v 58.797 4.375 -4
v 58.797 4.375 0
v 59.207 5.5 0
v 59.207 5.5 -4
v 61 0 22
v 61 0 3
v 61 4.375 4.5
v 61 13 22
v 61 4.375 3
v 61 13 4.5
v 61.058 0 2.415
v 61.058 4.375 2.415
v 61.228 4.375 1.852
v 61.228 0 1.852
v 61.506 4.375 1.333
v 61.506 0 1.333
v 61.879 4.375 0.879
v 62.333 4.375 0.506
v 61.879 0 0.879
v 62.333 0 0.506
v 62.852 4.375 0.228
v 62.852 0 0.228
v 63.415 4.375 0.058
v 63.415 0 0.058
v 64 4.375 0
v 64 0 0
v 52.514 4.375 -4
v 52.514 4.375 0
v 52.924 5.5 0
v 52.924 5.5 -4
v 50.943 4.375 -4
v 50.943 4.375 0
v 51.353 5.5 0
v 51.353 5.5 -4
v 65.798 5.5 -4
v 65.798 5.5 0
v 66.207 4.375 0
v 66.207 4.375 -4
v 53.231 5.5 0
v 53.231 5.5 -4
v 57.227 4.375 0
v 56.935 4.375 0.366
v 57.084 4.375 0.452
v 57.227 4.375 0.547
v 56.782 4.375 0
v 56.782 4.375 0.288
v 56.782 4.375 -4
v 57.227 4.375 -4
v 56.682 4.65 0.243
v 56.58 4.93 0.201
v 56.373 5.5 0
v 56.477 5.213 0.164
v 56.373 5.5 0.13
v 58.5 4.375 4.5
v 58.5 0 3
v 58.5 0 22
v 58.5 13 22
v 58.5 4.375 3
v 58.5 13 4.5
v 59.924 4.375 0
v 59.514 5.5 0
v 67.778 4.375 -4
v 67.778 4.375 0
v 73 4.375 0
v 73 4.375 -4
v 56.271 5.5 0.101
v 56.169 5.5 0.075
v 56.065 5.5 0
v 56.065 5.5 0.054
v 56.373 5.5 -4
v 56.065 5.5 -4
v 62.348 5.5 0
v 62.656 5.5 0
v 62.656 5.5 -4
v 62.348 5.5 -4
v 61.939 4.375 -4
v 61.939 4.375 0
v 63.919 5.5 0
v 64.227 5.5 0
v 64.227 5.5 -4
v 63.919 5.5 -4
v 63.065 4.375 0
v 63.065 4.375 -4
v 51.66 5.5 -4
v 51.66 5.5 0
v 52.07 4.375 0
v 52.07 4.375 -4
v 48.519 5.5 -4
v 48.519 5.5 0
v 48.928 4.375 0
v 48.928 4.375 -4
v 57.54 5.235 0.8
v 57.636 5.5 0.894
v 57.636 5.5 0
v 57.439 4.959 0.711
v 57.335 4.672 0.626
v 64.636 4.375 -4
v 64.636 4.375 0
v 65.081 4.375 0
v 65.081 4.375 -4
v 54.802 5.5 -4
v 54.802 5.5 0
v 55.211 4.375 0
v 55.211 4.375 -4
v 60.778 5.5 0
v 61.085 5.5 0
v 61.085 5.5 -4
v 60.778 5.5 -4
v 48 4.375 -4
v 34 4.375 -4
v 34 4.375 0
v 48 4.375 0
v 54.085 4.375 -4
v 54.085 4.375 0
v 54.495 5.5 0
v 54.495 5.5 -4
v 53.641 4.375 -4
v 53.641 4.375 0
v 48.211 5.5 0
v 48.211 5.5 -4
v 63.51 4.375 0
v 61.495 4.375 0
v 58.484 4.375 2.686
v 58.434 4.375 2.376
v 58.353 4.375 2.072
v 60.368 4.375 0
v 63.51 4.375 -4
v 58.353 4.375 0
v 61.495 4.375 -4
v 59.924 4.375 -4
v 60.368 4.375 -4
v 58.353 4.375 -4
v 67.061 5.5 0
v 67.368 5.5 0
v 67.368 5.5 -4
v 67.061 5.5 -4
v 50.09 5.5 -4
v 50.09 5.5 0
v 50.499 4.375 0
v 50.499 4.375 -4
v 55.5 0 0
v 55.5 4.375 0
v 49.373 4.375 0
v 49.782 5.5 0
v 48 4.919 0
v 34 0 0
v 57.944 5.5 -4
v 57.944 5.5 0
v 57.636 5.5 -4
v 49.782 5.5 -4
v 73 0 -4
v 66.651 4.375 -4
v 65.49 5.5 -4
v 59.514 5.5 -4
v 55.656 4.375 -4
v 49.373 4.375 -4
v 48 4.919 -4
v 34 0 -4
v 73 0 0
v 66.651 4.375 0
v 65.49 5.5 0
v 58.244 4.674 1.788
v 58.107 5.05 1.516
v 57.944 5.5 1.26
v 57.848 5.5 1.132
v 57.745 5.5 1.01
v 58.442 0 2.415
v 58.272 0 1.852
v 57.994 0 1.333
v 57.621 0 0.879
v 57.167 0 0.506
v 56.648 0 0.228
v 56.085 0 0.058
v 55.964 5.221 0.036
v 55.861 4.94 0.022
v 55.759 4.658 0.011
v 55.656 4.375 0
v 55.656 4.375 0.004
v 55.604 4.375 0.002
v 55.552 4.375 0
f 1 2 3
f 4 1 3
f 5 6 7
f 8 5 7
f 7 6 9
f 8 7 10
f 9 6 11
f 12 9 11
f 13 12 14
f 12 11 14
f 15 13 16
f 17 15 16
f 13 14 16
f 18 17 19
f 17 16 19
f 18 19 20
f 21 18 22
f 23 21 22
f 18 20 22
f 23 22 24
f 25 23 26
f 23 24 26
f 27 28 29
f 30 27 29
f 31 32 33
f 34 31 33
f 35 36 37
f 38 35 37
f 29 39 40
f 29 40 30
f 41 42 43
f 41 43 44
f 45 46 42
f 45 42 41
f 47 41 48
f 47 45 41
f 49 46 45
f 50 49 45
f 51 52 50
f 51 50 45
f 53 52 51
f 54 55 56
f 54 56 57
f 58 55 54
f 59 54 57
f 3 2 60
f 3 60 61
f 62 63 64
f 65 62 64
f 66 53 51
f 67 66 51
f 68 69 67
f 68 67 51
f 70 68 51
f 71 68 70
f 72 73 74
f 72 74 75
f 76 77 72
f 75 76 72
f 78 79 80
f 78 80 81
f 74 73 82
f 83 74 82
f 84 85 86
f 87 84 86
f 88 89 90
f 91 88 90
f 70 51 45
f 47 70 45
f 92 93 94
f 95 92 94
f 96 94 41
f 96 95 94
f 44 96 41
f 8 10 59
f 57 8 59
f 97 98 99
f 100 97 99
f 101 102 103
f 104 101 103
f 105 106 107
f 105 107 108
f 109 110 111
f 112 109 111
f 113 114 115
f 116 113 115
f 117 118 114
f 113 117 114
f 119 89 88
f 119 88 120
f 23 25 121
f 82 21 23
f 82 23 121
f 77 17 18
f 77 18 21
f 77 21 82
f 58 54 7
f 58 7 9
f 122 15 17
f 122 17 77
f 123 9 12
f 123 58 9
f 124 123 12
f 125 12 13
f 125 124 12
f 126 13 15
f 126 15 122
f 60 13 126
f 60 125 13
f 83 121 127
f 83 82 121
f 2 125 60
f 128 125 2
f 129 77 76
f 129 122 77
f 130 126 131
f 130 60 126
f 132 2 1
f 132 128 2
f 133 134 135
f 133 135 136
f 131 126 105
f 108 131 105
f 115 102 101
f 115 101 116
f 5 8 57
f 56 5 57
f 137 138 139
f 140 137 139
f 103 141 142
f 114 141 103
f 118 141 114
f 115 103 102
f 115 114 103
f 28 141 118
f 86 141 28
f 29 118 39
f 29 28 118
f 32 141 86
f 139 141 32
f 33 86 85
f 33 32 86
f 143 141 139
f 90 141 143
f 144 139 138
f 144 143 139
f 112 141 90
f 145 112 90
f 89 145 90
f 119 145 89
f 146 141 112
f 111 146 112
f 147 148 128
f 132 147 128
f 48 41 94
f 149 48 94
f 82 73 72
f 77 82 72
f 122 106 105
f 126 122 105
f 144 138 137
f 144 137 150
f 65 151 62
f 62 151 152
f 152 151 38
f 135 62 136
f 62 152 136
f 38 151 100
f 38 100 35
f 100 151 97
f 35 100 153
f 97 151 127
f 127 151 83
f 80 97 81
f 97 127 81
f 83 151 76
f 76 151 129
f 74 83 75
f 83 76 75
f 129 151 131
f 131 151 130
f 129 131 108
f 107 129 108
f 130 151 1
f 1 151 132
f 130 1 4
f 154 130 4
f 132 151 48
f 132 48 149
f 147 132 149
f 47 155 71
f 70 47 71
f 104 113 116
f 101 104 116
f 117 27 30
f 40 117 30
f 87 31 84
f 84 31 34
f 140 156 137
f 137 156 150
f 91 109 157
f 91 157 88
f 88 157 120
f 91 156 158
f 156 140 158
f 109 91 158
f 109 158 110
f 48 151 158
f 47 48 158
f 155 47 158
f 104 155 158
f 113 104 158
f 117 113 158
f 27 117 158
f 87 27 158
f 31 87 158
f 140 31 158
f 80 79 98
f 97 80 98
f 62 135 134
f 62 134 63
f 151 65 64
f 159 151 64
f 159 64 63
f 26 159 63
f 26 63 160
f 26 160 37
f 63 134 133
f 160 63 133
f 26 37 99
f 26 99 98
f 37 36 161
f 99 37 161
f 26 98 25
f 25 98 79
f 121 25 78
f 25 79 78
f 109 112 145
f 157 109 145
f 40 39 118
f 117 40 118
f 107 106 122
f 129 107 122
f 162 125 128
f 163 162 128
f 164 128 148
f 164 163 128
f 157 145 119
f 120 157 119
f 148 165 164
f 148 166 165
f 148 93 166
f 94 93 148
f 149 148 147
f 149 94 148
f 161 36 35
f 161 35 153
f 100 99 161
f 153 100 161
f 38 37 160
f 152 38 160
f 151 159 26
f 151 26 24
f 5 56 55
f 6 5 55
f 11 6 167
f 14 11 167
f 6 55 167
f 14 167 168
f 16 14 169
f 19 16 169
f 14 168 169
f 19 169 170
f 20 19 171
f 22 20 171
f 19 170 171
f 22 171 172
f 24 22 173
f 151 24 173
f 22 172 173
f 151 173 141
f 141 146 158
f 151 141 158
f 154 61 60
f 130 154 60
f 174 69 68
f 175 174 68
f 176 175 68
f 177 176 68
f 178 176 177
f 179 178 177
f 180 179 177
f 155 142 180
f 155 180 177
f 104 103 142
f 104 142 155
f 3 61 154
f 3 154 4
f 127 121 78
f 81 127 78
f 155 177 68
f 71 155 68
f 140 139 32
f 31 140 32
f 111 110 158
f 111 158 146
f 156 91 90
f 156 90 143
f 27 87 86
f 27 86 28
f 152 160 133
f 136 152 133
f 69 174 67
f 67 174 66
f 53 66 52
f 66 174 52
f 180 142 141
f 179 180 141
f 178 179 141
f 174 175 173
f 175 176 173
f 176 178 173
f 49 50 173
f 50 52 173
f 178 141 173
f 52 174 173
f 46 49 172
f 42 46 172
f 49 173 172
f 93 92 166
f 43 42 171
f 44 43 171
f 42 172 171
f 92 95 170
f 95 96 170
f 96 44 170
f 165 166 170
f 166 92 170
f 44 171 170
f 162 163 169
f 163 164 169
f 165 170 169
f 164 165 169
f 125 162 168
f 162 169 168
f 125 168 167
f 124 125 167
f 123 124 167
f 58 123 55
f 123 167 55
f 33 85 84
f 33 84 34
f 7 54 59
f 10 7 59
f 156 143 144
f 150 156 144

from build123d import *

# Parameters (mm, degrees)
BLANKSKE_W               = 20
BLANKSKE_H               = 5.5
BLANK_DEPTH              = 4
TOOTHCUTSIM_DEPTH        = 22.124630174
TEETHCUTS_COUNT          = 14
TEETHCUTS_PITCH          = 1.570796325
SKETCH1_W                = 2.5
SKETCH1_H                = 13
BOSS_EXTRUDE1_DEPTH      = 22
BOSS_EXTRUDE3_DEPTH      = 5
BOSS_EXTRUDE3_DEPTH_BACK = 34
SKETCH3_W                = 4
SKETCH3_H                = 4.375
CUT_EXTRUDE1_DEPTH       = 38.175260591
CUT_EXTRUDE1_DEPTH_BACK  = 38.175260591
SKETCH4_W                = 4.5
SKETCH4_H                = 8.625
FILLET1_R                = 3


with BuildPart() as part:
    # BlankSke → Blank (new body)
    with BuildSketch(Plane.XY):
        with Locations((10, 2.75)):
            Rectangle(BLANKSKE_W, BLANKSKE_H)
    extrude(amount=-BLANK_DEPTH)

    # TooCutSkeSim → ToothCutSim (cut, through all)
    with BuildSketch(Plane.XY):
        Polygon((0.222217685, 4.375), (-0.222217685, 4.375), (-0.640929042, 5.5254), (0.640929042, 5.5254), align=None)
    toothcutsim = extrude(amount=-TOOTHCUTSIM_DEPTH, mode=Mode.SUBTRACT)

    # TeethCuts: ToothCutSim ×14
    with Locations(*[(i * TEETHCUTS_PITCH, 0, 0) for i in range(1, TEETHCUTS_COUNT)]):
        add(toothcutsim, mode=Mode.SUBTRACT)

    # Sketch1 → Boss-Extrude1 (add)
    with BuildSketch(Plane.XY):
        with Locations((8.25, 6.5)):
            Rectangle(SKETCH1_W, SKETCH1_H)
    extrude(amount=BOSS_EXTRUDE1_DEPTH)

    # Sketch3 → Boss-Extrude3 (add, two sides: drawn at the far end of the back side and taken through both)
    with BuildSketch(Plane.ZY.offset(-BOSS_EXTRUDE3_DEPTH_BACK)):
        with Locations((-2, 2.1875)):
            Rectangle(SKETCH3_W, SKETCH3_H)
    extrude(amount=BOSS_EXTRUDE3_DEPTH + BOSS_EXTRUDE3_DEPTH_BACK)

    # Sketch4 → Cut-Extrude1 (cut, two sides: drawn at the far end of the back side and taken through both)
    with BuildSketch(Plane.ZY.offset(-7).offset(-CUT_EXTRUDE1_DEPTH_BACK)):
        with Locations((2.25, 8.6875)):
            Rectangle(SKETCH4_W, SKETCH4_H)
    extrude(amount=CUT_EXTRUDE1_DEPTH + CUT_EXTRUDE1_DEPTH_BACK, mode=Mode.SUBTRACT)

    # Fillet1
    # the kernel refuses this fillet: 3 mm, written as the material it adds along each edge
    with BuildSketch(Plane(origin=(7, 0, 0), x_dir=(0, 0, 1), z_dir=(0, 1, 0))) as fillet1_piece_1:
        with BuildLine():
            CenterArc((FILLET1_R, -FILLET1_R), FILLET1_R, 90, 90)
            Line((0, -FILLET1_R), (0, 0))
            Line((0, 0), (FILLET1_R, 0))
        make_face()
    extrude(amount=4.375)
    with BuildSketch(Plane(origin=(9.5, 0, 0), x_dir=(0, 0, 1), z_dir=(0, 1, 0))) as fillet1_piece_2:
        with BuildLine():
            CenterArc((FILLET1_R, FILLET1_R), FILLET1_R, 180, 90)
            Line((0, FILLET1_R), (0, 0))
            Line((0, 0), (FILLET1_R, 0))
        make_face()
    extrude(amount=4.375)
    with BuildSketch(Plane(origin=(9.5, -7.5, 0), x_dir=(0, 0, 1), z_dir=(0, 1, 0))) as fillet1_piece_3_section:
        with BuildLine():
            CenterArc((FILLET1_R, FILLET1_R), FILLET1_R, 180, 90)
            Line((0, FILLET1_R), (0, 0))
            Line((0, 0), (FILLET1_R, 0))
        make_face()
    fillet1_piece_3 = extrude(amount=19.375, mode=Mode.PRIVATE)
    fillet1_piece_3 = split(fillet1_piece_3, bisect_by=Plane(origin=(11.636487366, 4.375, 0.067590567), z_dir=(0, 1, 0)), keep=Keep.TOP, mode=Mode.PRIVATE)
    fillet1_piece_3 = split(fillet1_piece_3, bisect_by=Plane(origin=(11.636487366, 5.5, 0.067590567), z_dir=(0, -1, 0)), keep=Keep.TOP, mode=Mode.PRIVATE)
    fillet1_piece_3 = split(fillet1_piece_3, bisect_by=Plane(origin=(11.407964632, 4.897495122, 0.067590567), z_dir=(0.9396926207859105, -0.3420201433256629, 0)), keep=Keep.TOP, mode=Mode.PRIVATE)
    fillet1_piece_3 = split(fillet1_piece_3, bisect_by=Plane(origin=(12.120177158, 4.990368336, 0.067590567), z_dir=(-0.9396926207859105, -0.3420201433256629, 0)), keep=Keep.TOP, mode=Mode.PRIVATE)
    add(fillet1_piece_3)
    with BuildSketch(Plane(origin=(9.5, -7.5, 0), x_dir=(0, 0, 1), z_dir=(0, 1, 0))) as fillet1_piece_4_section:
        with BuildLine():
            CenterArc((FILLET1_R, FILLET1_R), FILLET1_R, 180, 90)
            Line((0, FILLET1_R), (0, 0))
            Line((0, 0), (FILLET1_R, 0))
        make_face()
    fillet1_piece_4 = extrude(amount=19.375, mode=Mode.PRIVATE)
    fillet1_piece_4 = split(fillet1_piece_4, bisect_by=Plane(origin=(10.146205087, 4.375, 0.590480104), z_dir=(0, 1, 0)), keep=Keep.TOP, mode=Mode.PRIVATE)
    fillet1_piece_4 = split(fillet1_piece_4, bisect_by=Plane(origin=(9.84999644, 4.932740127, 0.590480104), z_dir=(0.9396926207859105, -0.3420201433256629, 0)), keep=Keep.TOP, mode=Mode.PRIVATE)
    fillet1_piece_4 = split(fillet1_piece_4, bisect_by=Plane(origin=(10.146205087, 5.5, 0.590480104), z_dir=(0, -1, 0)), keep=Keep.TOP, mode=Mode.PRIVATE)
    fillet1_piece_4 = split(fillet1_piece_4, bisect_by=Plane(origin=(10.555389409, 4.97385991, 0.590480104), z_dir=(-0.9396926207859105, -0.3420201433256629, 0)), keep=Keep.TOP, mode=Mode.PRIVATE)
    add(fillet1_piece_4)


with BuildPart() as body_2:
    # Mirror1: mirrored copy
    add(part.part.mirror(Plane(origin=(34, 0, -4), x_dir=(0, 0, 1), z_dir=(1, 0, 0))))


solid = body_2.part
